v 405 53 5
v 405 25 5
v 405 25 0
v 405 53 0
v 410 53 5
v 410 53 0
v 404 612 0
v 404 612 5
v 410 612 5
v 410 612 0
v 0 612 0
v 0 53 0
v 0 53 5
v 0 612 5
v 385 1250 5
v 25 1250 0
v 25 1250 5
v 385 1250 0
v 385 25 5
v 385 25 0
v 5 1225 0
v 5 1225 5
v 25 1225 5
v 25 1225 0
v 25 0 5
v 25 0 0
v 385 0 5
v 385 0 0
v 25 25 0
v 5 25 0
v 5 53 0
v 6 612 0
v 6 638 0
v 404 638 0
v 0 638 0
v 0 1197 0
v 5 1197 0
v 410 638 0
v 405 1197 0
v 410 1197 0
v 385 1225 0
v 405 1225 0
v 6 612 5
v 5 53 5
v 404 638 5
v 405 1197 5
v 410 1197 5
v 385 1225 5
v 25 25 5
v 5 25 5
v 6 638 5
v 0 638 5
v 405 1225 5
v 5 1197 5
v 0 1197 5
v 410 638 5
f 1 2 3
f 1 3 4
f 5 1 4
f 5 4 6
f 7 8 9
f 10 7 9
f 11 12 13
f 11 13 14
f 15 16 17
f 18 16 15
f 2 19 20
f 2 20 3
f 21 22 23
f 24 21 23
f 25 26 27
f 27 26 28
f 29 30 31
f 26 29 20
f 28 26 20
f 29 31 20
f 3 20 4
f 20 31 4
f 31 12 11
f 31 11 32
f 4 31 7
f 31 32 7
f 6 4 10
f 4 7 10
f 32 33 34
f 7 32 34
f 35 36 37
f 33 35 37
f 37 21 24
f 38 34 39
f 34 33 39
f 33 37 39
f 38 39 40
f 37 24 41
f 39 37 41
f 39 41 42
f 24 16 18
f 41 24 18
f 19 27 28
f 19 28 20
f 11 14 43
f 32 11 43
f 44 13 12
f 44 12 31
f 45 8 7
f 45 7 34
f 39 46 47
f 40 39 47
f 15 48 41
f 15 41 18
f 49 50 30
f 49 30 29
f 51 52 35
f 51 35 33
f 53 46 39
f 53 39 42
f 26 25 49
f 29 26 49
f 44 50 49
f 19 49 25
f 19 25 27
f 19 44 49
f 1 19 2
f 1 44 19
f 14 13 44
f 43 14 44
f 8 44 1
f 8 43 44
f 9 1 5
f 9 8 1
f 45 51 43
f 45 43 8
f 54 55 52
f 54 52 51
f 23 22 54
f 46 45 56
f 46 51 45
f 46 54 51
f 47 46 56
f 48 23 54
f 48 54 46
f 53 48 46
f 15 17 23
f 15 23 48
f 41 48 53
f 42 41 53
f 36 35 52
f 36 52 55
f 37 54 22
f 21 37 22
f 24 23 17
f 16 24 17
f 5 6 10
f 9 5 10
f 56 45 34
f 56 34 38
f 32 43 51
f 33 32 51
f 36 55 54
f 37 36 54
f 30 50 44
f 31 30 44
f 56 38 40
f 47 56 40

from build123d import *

# Parameters (mm, degrees)
F0_W      = 410
F0_H      = 1250
F1_DEPTH  = 5
F2_W      = 25
F2_H      = 25
F3_DEPTH  = 25
F4_W      = 25
F4_H      = 25
F5_DEPTH  = 25
F6_W      = 25
F6_H      = 25
F7_DEPTH  = 25
F8_W      = 25
F8_H      = 25
F9_DEPTH  = 25
F10_W     = 12
F10_H     = 26
F11_DEPTH = 25
F12_W     = 12
F12_H     = 26
F13_DEPTH = 25
F14_W     = 5
F14_H     = 28
F15_DEPTH = 25
F16_W     = 5
F16_H     = 28
F17_DEPTH = 25
F18_W     = 5
F18_H     = 28
F19_DEPTH = 25
F20_W     = 5
F20_H     = 28
F21_DEPTH = 25


with BuildPart() as f1:
    # F0 (on Top) → F1 (new body)
    with BuildSketch(Plane.XY):
        with Locations((205, 625)):
            Rectangle(F0_W, F0_H)
    extrude(amount=F1_DEPTH)

    # F2 (on face) → F3 (cut)
    with BuildSketch(Plane.XY.offset(5)):
        with Locations((12.5, 12.5)):
            Rectangle(F2_W, F2_H)
    extrude(amount=-F3_DEPTH, mode=Mode.SUBTRACT)

    # F4 (on face) → F5 (cut)
    with BuildSketch(Plane.XY.offset(5)):
        with Locations((397.5, 12.5)):
            Rectangle(F4_W, F4_H)
    extrude(amount=-F5_DEPTH, mode=Mode.SUBTRACT)

    # F6 (on face) → F7 (cut)
    with BuildSketch(Plane.XY.offset(5)):
        with Locations((397.5, 1237.5)):
            Rectangle(F6_W, F6_H)
    extrude(amount=-F7_DEPTH, mode=Mode.SUBTRACT)

    # F8 (on face) → F9 (cut)
    with BuildSketch(Plane.XY.offset(5)):
        with Locations((12.5, 1237.5)):
            Rectangle(F8_W, F8_H)
    extrude(amount=-F9_DEPTH, mode=Mode.SUBTRACT)

    # F10 (on face) → F11 (cut)
    with BuildSketch(Plane.XY.offset(5)):
        with Locations((0, 625)):
            Rectangle(F10_W, F10_H)
    extrude(amount=-F11_DEPTH, mode=Mode.SUBTRACT)

    # F12 (on face) → F13 (cut)
    with BuildSketch(Plane.XY.offset(5)):
        with Locations((410, 625)):
            Rectangle(F12_W, F12_H)
    extrude(amount=-F13_DEPTH, mode=Mode.SUBTRACT)

    # F14 (on face) → F15 (cut)
    with BuildSketch(Plane.XY.offset(5)):
        with Locations((407.5, 39)):
            Rectangle(F14_W, F14_H)
    extrude(amount=-F15_DEPTH, mode=Mode.SUBTRACT)

    # F16 (on face) → F17 (cut)
    with BuildSketch(Plane.XY.offset(5)):
        with Locations((407.5, 1211)):
            Rectangle(F16_W, F16_H)
    extrude(amount=-F17_DEPTH, mode=Mode.SUBTRACT)

    # F18 (on face) → F19 (cut)
    with BuildSketch(Plane.XY.offset(5)):
        with Locations((2.5, 1211)):
            Rectangle(F18_W, F18_H)
    extrude(amount=-F19_DEPTH, mode=Mode.SUBTRACT)

    # F20 (on face) → F21 (cut)
    with BuildSketch(Plane.XY.offset(5)):
        with Locations((2.5, 39)):
            Rectangle(F20_W, F20_H)
    extrude(amount=-F21_DEPTH, mode=Mode.SUBTRACT)


solid = f1.part
